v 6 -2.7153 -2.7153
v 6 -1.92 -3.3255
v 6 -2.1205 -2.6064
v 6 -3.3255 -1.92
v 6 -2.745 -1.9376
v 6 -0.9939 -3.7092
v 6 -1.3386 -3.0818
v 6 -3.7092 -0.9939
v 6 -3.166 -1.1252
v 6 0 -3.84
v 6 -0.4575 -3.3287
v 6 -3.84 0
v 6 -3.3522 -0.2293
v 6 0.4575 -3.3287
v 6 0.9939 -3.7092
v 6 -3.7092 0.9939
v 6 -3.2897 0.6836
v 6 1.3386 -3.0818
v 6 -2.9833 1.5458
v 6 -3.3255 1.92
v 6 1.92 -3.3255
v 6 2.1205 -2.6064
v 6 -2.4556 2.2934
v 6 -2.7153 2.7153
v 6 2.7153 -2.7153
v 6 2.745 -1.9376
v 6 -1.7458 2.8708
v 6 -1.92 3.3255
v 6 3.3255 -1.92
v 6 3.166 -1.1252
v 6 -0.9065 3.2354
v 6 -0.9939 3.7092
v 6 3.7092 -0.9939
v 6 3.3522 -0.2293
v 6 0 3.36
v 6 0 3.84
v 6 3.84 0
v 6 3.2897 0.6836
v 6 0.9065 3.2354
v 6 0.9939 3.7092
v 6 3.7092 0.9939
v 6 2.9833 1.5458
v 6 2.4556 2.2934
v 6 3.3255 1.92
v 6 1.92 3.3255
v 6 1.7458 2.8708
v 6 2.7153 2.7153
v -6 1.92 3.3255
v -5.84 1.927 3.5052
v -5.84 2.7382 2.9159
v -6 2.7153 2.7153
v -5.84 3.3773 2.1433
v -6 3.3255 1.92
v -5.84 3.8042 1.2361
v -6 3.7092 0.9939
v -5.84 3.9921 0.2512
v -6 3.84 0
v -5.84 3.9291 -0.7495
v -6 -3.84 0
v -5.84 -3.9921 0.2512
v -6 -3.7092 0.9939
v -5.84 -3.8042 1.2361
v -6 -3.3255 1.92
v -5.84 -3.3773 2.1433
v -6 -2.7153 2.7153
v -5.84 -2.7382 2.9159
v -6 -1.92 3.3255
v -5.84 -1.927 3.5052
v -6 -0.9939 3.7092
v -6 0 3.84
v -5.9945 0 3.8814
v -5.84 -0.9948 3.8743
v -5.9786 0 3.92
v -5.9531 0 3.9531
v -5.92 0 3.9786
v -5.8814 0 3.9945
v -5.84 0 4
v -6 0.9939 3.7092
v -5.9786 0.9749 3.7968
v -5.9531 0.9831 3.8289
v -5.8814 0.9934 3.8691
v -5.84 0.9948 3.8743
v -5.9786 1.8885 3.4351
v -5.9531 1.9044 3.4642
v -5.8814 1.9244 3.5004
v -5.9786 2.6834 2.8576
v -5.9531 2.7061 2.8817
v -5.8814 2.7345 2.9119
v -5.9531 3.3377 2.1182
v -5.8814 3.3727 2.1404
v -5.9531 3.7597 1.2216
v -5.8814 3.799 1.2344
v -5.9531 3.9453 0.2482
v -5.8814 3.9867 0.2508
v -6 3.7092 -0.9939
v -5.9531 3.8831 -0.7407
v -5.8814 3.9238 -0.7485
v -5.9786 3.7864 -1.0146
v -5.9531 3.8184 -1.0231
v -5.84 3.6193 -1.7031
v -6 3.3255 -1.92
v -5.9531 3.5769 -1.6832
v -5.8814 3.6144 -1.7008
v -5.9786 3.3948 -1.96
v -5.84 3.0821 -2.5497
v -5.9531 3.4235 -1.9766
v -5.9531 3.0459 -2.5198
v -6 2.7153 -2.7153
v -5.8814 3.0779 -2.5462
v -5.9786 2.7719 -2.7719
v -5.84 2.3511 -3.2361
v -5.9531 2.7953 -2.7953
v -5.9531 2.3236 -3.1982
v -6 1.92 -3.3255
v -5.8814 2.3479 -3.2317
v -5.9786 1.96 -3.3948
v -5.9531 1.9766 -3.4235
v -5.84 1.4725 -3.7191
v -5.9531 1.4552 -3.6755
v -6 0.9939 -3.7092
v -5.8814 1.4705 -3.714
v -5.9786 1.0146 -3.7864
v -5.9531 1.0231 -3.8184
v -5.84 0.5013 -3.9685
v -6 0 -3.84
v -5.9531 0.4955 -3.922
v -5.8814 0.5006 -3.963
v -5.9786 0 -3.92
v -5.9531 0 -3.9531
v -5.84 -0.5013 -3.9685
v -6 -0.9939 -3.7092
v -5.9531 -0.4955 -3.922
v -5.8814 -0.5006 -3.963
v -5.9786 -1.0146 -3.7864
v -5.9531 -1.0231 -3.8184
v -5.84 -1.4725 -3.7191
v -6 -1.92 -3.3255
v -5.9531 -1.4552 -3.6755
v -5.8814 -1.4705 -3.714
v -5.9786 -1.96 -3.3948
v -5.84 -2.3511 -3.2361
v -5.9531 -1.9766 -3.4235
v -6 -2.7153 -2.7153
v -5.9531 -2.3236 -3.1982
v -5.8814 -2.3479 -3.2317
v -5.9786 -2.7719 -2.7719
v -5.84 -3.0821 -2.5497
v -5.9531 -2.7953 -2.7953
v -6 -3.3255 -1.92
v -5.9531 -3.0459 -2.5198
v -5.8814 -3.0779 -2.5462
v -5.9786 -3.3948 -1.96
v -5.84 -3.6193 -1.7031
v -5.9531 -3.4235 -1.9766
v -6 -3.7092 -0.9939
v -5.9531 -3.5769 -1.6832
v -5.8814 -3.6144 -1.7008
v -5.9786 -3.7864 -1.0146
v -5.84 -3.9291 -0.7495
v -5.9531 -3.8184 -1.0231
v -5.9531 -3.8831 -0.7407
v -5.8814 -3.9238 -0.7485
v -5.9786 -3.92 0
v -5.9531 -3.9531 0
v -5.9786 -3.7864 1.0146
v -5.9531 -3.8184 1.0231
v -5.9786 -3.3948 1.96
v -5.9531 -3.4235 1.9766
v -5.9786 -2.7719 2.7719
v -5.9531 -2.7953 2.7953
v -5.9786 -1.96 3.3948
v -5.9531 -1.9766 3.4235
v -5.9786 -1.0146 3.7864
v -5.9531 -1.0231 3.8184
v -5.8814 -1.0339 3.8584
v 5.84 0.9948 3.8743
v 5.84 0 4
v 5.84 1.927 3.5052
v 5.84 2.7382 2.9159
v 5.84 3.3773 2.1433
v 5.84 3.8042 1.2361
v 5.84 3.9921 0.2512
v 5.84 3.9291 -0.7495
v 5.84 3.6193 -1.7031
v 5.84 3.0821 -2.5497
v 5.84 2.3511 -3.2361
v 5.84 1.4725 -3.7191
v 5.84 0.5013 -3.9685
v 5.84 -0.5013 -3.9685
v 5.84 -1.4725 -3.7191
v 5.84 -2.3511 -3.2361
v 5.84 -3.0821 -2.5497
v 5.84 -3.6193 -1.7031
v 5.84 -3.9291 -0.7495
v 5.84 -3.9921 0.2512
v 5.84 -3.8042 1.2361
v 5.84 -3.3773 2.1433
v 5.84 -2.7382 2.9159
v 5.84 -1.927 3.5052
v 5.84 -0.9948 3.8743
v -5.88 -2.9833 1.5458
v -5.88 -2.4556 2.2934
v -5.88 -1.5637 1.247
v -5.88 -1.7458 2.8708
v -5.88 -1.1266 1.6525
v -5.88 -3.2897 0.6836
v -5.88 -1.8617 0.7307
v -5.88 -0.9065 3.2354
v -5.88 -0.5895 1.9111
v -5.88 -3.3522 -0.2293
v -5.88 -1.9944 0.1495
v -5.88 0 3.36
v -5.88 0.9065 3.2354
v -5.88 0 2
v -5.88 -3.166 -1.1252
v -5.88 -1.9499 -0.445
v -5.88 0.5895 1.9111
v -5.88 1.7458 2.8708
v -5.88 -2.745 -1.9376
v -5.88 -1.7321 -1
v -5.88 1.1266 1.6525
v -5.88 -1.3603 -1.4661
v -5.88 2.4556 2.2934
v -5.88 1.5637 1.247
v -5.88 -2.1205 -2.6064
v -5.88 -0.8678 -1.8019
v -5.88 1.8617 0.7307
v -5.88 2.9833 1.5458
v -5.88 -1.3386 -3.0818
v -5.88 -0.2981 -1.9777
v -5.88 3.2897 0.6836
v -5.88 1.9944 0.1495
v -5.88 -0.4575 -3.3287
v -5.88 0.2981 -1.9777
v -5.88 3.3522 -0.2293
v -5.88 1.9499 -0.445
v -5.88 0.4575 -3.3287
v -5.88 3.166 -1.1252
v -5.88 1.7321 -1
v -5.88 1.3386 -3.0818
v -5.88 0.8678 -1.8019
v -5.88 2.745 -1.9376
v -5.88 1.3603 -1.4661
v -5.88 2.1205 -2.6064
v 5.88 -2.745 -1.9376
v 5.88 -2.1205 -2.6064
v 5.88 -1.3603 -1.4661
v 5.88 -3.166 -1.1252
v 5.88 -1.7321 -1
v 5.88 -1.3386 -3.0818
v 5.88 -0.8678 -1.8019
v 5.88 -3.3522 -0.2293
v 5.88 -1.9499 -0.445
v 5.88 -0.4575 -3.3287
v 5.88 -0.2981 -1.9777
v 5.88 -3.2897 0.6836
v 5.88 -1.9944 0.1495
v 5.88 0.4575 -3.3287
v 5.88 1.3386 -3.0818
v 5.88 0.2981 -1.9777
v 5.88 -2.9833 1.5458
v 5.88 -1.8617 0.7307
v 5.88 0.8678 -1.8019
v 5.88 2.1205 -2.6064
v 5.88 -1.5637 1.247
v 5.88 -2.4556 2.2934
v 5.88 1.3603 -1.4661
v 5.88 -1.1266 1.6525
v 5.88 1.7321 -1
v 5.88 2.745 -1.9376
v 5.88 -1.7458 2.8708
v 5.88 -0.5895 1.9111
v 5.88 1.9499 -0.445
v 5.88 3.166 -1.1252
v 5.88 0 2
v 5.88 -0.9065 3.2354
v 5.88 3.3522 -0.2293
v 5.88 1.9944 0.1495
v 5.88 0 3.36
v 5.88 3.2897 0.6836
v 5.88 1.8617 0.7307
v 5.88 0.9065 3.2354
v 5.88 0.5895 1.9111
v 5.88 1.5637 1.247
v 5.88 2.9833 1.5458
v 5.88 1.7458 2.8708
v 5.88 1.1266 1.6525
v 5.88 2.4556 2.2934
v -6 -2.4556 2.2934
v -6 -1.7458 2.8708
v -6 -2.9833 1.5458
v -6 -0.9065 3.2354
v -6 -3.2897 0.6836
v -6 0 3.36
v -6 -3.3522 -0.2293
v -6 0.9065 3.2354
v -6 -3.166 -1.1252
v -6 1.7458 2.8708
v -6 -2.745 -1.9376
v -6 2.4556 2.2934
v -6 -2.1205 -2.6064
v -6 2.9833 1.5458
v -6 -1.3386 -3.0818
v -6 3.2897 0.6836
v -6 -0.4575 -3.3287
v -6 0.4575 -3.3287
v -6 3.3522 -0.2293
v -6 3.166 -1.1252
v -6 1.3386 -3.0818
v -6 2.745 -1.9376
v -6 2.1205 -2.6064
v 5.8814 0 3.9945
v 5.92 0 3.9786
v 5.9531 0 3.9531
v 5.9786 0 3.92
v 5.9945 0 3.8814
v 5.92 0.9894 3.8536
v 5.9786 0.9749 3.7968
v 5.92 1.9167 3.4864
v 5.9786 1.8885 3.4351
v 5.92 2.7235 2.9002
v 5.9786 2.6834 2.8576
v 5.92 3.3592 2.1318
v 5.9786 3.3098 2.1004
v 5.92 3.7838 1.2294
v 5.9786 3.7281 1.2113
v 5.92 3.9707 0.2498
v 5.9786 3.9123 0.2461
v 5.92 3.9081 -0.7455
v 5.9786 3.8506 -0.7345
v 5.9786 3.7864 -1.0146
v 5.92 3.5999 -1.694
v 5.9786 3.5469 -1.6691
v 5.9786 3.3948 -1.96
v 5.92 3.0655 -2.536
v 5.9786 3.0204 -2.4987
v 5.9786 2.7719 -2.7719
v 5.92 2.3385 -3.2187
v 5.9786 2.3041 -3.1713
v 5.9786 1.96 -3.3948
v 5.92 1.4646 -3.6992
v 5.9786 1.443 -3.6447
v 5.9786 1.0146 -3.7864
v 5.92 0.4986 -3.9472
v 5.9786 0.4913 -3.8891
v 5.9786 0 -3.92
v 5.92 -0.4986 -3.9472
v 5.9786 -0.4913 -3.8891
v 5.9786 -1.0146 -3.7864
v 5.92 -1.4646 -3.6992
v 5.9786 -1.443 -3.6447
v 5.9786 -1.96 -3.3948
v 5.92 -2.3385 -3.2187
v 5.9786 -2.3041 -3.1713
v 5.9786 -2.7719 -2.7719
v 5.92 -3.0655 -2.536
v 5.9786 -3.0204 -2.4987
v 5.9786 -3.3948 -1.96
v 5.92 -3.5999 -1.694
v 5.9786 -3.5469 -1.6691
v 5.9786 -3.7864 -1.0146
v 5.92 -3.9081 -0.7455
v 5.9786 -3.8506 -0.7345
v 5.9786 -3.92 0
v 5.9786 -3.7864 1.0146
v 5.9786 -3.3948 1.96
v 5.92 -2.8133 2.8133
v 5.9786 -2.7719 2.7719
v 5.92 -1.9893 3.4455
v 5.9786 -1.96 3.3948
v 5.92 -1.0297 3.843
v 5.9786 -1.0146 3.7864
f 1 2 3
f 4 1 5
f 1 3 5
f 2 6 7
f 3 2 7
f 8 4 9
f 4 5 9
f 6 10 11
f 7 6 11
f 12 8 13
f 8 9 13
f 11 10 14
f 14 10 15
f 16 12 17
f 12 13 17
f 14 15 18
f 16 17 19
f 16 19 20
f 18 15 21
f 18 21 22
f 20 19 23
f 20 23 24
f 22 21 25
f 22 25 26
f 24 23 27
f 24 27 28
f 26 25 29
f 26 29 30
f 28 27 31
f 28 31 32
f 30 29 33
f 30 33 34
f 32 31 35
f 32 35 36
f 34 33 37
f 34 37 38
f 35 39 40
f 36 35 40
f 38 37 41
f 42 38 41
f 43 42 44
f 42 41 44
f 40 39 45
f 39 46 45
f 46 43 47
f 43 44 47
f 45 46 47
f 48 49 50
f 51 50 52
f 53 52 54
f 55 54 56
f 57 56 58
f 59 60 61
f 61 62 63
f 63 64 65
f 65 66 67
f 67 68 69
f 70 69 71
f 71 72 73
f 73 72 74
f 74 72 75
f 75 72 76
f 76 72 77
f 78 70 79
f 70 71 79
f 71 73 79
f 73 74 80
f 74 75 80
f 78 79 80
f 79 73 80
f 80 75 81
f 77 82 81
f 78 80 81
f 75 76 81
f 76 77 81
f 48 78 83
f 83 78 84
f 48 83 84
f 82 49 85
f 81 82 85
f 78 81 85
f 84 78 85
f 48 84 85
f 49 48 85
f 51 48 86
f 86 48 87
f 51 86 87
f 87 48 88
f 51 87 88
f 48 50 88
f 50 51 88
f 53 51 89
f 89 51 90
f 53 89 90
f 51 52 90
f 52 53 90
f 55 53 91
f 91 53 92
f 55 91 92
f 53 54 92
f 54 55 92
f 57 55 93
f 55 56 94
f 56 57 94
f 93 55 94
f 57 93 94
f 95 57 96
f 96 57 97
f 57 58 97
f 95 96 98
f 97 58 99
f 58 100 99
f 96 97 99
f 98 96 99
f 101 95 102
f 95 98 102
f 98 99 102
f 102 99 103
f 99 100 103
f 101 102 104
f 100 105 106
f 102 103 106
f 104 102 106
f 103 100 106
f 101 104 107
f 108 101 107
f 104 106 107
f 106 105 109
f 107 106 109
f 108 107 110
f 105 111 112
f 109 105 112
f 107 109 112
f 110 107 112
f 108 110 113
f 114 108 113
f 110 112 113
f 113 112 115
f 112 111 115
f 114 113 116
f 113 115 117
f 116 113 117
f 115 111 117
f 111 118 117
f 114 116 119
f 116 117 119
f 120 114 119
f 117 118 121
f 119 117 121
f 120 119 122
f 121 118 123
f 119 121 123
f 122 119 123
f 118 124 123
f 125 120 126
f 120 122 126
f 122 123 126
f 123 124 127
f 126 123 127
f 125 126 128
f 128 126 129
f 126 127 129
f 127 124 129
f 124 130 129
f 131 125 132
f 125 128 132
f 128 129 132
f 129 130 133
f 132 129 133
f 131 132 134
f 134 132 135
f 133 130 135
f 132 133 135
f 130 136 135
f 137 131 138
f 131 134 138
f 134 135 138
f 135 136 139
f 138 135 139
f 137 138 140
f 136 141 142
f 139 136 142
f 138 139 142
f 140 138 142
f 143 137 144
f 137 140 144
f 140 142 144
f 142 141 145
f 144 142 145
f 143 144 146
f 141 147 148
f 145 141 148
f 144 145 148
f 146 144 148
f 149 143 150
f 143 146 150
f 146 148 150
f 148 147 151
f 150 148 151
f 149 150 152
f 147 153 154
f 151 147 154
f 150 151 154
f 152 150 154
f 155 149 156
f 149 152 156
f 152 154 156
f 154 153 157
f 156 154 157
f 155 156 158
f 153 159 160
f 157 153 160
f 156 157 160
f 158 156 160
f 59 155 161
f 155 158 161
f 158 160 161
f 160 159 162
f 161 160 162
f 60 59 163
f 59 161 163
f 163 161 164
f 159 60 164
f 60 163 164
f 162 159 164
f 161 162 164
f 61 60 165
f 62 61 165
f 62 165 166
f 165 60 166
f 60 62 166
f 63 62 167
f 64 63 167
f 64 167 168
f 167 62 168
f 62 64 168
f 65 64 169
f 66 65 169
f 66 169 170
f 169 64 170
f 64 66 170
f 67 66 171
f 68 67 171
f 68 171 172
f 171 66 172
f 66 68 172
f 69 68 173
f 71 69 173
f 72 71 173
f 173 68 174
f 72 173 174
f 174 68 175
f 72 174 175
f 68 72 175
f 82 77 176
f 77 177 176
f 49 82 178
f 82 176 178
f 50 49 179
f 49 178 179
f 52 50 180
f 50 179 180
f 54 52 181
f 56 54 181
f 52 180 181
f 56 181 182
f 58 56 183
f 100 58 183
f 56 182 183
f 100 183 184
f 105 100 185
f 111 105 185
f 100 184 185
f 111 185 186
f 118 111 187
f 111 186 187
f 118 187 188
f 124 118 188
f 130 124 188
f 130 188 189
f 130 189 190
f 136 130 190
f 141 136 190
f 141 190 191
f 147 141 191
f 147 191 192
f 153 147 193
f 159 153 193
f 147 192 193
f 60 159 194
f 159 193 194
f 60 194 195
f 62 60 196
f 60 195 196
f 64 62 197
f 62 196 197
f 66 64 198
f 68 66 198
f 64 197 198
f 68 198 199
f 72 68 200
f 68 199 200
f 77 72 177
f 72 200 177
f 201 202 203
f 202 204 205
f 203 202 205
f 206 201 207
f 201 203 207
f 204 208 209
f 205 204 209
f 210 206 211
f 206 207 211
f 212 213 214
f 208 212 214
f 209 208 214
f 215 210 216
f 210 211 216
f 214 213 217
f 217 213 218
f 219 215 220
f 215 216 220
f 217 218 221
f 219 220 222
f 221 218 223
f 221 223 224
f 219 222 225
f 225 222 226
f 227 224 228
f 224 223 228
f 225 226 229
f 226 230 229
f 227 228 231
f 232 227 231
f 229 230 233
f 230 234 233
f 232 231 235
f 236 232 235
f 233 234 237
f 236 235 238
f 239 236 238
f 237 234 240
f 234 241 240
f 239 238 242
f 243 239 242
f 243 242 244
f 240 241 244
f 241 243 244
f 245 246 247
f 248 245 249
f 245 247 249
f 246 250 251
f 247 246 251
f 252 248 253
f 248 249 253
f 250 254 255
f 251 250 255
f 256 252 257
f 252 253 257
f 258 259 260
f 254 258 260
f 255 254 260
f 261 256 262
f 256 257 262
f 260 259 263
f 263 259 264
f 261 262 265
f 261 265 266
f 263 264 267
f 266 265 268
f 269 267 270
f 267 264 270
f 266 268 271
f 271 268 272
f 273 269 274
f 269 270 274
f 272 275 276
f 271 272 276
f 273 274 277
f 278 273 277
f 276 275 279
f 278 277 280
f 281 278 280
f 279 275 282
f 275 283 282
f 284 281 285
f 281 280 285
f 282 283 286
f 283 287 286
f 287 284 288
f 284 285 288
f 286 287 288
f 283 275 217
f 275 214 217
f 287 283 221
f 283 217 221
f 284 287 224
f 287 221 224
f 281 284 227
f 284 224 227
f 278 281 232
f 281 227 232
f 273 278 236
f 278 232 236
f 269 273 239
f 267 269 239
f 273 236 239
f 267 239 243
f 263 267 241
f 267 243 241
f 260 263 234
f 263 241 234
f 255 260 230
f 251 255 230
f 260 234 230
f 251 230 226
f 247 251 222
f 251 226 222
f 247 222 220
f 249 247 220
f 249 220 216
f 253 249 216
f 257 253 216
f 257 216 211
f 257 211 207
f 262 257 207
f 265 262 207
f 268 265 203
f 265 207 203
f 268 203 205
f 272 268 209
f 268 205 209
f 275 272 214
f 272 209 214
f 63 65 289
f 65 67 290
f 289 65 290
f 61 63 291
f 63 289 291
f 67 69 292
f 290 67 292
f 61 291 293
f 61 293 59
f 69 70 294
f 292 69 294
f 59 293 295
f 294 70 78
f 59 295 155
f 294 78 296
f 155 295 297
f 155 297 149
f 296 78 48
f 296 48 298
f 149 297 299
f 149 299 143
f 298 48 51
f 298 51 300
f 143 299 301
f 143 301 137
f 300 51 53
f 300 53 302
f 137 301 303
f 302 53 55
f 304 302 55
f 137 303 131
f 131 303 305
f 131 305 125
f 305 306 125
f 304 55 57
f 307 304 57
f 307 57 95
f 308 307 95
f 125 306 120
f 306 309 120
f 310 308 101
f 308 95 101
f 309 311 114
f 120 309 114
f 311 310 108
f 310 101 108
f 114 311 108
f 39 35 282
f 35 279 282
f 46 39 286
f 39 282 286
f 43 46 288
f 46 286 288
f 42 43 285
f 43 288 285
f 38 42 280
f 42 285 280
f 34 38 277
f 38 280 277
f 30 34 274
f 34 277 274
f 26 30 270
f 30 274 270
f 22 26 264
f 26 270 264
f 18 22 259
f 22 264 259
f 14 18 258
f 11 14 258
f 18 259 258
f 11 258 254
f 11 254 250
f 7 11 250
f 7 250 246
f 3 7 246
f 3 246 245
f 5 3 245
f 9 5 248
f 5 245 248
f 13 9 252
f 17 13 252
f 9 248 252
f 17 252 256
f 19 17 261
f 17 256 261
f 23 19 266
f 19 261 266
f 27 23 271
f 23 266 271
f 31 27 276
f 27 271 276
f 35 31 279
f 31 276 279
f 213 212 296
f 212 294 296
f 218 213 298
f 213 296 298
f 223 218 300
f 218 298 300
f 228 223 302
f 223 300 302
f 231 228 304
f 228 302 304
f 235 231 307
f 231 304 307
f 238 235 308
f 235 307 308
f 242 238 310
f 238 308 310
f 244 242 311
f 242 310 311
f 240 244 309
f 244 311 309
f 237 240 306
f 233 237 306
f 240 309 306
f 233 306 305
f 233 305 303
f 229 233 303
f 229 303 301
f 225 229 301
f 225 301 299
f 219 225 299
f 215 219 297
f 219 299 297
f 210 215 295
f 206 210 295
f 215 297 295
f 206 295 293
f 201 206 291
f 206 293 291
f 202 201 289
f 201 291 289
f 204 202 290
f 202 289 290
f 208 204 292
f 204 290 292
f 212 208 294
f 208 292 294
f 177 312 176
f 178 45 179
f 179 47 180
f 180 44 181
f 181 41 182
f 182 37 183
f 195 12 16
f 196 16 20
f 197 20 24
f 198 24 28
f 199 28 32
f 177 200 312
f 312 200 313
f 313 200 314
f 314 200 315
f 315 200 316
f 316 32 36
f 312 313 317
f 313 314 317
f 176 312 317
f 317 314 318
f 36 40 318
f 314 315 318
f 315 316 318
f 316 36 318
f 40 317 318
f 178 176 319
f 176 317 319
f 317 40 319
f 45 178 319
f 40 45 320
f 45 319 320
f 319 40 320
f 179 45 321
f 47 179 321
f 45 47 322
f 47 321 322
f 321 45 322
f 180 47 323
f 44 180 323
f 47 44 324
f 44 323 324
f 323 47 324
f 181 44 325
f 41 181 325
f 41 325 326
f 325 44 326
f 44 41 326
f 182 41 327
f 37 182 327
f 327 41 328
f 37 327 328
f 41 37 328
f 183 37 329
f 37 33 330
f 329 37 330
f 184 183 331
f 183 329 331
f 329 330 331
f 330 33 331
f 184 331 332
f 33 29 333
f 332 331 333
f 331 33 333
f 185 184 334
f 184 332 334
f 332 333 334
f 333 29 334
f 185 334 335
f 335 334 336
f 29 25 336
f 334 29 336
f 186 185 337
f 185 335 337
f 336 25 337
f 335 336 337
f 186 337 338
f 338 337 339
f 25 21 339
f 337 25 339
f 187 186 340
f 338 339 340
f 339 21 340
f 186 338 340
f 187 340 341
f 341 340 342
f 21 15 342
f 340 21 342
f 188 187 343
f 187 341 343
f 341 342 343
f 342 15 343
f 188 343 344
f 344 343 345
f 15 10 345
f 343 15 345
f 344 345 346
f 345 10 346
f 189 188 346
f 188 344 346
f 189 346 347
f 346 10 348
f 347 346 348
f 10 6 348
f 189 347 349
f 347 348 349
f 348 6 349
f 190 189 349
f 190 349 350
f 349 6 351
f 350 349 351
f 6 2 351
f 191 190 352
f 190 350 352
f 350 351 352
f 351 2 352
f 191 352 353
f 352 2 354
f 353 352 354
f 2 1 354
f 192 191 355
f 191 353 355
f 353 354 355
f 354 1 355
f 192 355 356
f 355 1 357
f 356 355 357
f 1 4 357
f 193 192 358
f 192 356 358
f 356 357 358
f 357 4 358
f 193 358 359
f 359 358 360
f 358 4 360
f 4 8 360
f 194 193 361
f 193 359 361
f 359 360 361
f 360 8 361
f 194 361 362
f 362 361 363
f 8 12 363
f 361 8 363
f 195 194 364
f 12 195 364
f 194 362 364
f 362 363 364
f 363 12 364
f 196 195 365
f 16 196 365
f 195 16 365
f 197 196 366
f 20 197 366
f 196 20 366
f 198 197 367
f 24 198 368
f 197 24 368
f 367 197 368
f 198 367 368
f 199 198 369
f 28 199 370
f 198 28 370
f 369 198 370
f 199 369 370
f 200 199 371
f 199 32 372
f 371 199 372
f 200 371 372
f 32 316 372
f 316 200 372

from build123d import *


with BuildPart() as part:
    # Sketch1 → Revolve1 (revolve)
    with BuildSketch(Plane(origin=(0, 0, 0), x_dir=(-1, 0, 0), z_dir=(0, 0, -1)), mode=Mode.PRIVATE) as revolve1_sk:
        with BuildLine():
            Line((5.84, 4), (-5.84, 4))
            ThreePointArc((-5.84, 4), (-5.953137085, 3.953137085), (-6, 3.84))
            Line((-6, 3.84), (-6, 3.36))
            Line((-6, 3.36), (-5.88, 3.36))
            Line((-5.88, 3.36), (-5.88, 2))
            Line((-5.88, 2), (5.88, 2))
            Line((5.88, 2), (5.88, 3.36))
            Line((5.88, 3.36), (6, 3.36))
            Line((6, 3.36), (6, 3.84))
            ThreePointArc((6, 3.84), (5.953137085, 3.953137085), (5.84, 4))
        make_face()
    revolve(revolve1_sk.sketch.rotate(Axis((6, 0, 0), (-1, 0, 0)), 270), axis=Axis((6, 0, 0), (-1, 0, 0)))


solid = part.part
